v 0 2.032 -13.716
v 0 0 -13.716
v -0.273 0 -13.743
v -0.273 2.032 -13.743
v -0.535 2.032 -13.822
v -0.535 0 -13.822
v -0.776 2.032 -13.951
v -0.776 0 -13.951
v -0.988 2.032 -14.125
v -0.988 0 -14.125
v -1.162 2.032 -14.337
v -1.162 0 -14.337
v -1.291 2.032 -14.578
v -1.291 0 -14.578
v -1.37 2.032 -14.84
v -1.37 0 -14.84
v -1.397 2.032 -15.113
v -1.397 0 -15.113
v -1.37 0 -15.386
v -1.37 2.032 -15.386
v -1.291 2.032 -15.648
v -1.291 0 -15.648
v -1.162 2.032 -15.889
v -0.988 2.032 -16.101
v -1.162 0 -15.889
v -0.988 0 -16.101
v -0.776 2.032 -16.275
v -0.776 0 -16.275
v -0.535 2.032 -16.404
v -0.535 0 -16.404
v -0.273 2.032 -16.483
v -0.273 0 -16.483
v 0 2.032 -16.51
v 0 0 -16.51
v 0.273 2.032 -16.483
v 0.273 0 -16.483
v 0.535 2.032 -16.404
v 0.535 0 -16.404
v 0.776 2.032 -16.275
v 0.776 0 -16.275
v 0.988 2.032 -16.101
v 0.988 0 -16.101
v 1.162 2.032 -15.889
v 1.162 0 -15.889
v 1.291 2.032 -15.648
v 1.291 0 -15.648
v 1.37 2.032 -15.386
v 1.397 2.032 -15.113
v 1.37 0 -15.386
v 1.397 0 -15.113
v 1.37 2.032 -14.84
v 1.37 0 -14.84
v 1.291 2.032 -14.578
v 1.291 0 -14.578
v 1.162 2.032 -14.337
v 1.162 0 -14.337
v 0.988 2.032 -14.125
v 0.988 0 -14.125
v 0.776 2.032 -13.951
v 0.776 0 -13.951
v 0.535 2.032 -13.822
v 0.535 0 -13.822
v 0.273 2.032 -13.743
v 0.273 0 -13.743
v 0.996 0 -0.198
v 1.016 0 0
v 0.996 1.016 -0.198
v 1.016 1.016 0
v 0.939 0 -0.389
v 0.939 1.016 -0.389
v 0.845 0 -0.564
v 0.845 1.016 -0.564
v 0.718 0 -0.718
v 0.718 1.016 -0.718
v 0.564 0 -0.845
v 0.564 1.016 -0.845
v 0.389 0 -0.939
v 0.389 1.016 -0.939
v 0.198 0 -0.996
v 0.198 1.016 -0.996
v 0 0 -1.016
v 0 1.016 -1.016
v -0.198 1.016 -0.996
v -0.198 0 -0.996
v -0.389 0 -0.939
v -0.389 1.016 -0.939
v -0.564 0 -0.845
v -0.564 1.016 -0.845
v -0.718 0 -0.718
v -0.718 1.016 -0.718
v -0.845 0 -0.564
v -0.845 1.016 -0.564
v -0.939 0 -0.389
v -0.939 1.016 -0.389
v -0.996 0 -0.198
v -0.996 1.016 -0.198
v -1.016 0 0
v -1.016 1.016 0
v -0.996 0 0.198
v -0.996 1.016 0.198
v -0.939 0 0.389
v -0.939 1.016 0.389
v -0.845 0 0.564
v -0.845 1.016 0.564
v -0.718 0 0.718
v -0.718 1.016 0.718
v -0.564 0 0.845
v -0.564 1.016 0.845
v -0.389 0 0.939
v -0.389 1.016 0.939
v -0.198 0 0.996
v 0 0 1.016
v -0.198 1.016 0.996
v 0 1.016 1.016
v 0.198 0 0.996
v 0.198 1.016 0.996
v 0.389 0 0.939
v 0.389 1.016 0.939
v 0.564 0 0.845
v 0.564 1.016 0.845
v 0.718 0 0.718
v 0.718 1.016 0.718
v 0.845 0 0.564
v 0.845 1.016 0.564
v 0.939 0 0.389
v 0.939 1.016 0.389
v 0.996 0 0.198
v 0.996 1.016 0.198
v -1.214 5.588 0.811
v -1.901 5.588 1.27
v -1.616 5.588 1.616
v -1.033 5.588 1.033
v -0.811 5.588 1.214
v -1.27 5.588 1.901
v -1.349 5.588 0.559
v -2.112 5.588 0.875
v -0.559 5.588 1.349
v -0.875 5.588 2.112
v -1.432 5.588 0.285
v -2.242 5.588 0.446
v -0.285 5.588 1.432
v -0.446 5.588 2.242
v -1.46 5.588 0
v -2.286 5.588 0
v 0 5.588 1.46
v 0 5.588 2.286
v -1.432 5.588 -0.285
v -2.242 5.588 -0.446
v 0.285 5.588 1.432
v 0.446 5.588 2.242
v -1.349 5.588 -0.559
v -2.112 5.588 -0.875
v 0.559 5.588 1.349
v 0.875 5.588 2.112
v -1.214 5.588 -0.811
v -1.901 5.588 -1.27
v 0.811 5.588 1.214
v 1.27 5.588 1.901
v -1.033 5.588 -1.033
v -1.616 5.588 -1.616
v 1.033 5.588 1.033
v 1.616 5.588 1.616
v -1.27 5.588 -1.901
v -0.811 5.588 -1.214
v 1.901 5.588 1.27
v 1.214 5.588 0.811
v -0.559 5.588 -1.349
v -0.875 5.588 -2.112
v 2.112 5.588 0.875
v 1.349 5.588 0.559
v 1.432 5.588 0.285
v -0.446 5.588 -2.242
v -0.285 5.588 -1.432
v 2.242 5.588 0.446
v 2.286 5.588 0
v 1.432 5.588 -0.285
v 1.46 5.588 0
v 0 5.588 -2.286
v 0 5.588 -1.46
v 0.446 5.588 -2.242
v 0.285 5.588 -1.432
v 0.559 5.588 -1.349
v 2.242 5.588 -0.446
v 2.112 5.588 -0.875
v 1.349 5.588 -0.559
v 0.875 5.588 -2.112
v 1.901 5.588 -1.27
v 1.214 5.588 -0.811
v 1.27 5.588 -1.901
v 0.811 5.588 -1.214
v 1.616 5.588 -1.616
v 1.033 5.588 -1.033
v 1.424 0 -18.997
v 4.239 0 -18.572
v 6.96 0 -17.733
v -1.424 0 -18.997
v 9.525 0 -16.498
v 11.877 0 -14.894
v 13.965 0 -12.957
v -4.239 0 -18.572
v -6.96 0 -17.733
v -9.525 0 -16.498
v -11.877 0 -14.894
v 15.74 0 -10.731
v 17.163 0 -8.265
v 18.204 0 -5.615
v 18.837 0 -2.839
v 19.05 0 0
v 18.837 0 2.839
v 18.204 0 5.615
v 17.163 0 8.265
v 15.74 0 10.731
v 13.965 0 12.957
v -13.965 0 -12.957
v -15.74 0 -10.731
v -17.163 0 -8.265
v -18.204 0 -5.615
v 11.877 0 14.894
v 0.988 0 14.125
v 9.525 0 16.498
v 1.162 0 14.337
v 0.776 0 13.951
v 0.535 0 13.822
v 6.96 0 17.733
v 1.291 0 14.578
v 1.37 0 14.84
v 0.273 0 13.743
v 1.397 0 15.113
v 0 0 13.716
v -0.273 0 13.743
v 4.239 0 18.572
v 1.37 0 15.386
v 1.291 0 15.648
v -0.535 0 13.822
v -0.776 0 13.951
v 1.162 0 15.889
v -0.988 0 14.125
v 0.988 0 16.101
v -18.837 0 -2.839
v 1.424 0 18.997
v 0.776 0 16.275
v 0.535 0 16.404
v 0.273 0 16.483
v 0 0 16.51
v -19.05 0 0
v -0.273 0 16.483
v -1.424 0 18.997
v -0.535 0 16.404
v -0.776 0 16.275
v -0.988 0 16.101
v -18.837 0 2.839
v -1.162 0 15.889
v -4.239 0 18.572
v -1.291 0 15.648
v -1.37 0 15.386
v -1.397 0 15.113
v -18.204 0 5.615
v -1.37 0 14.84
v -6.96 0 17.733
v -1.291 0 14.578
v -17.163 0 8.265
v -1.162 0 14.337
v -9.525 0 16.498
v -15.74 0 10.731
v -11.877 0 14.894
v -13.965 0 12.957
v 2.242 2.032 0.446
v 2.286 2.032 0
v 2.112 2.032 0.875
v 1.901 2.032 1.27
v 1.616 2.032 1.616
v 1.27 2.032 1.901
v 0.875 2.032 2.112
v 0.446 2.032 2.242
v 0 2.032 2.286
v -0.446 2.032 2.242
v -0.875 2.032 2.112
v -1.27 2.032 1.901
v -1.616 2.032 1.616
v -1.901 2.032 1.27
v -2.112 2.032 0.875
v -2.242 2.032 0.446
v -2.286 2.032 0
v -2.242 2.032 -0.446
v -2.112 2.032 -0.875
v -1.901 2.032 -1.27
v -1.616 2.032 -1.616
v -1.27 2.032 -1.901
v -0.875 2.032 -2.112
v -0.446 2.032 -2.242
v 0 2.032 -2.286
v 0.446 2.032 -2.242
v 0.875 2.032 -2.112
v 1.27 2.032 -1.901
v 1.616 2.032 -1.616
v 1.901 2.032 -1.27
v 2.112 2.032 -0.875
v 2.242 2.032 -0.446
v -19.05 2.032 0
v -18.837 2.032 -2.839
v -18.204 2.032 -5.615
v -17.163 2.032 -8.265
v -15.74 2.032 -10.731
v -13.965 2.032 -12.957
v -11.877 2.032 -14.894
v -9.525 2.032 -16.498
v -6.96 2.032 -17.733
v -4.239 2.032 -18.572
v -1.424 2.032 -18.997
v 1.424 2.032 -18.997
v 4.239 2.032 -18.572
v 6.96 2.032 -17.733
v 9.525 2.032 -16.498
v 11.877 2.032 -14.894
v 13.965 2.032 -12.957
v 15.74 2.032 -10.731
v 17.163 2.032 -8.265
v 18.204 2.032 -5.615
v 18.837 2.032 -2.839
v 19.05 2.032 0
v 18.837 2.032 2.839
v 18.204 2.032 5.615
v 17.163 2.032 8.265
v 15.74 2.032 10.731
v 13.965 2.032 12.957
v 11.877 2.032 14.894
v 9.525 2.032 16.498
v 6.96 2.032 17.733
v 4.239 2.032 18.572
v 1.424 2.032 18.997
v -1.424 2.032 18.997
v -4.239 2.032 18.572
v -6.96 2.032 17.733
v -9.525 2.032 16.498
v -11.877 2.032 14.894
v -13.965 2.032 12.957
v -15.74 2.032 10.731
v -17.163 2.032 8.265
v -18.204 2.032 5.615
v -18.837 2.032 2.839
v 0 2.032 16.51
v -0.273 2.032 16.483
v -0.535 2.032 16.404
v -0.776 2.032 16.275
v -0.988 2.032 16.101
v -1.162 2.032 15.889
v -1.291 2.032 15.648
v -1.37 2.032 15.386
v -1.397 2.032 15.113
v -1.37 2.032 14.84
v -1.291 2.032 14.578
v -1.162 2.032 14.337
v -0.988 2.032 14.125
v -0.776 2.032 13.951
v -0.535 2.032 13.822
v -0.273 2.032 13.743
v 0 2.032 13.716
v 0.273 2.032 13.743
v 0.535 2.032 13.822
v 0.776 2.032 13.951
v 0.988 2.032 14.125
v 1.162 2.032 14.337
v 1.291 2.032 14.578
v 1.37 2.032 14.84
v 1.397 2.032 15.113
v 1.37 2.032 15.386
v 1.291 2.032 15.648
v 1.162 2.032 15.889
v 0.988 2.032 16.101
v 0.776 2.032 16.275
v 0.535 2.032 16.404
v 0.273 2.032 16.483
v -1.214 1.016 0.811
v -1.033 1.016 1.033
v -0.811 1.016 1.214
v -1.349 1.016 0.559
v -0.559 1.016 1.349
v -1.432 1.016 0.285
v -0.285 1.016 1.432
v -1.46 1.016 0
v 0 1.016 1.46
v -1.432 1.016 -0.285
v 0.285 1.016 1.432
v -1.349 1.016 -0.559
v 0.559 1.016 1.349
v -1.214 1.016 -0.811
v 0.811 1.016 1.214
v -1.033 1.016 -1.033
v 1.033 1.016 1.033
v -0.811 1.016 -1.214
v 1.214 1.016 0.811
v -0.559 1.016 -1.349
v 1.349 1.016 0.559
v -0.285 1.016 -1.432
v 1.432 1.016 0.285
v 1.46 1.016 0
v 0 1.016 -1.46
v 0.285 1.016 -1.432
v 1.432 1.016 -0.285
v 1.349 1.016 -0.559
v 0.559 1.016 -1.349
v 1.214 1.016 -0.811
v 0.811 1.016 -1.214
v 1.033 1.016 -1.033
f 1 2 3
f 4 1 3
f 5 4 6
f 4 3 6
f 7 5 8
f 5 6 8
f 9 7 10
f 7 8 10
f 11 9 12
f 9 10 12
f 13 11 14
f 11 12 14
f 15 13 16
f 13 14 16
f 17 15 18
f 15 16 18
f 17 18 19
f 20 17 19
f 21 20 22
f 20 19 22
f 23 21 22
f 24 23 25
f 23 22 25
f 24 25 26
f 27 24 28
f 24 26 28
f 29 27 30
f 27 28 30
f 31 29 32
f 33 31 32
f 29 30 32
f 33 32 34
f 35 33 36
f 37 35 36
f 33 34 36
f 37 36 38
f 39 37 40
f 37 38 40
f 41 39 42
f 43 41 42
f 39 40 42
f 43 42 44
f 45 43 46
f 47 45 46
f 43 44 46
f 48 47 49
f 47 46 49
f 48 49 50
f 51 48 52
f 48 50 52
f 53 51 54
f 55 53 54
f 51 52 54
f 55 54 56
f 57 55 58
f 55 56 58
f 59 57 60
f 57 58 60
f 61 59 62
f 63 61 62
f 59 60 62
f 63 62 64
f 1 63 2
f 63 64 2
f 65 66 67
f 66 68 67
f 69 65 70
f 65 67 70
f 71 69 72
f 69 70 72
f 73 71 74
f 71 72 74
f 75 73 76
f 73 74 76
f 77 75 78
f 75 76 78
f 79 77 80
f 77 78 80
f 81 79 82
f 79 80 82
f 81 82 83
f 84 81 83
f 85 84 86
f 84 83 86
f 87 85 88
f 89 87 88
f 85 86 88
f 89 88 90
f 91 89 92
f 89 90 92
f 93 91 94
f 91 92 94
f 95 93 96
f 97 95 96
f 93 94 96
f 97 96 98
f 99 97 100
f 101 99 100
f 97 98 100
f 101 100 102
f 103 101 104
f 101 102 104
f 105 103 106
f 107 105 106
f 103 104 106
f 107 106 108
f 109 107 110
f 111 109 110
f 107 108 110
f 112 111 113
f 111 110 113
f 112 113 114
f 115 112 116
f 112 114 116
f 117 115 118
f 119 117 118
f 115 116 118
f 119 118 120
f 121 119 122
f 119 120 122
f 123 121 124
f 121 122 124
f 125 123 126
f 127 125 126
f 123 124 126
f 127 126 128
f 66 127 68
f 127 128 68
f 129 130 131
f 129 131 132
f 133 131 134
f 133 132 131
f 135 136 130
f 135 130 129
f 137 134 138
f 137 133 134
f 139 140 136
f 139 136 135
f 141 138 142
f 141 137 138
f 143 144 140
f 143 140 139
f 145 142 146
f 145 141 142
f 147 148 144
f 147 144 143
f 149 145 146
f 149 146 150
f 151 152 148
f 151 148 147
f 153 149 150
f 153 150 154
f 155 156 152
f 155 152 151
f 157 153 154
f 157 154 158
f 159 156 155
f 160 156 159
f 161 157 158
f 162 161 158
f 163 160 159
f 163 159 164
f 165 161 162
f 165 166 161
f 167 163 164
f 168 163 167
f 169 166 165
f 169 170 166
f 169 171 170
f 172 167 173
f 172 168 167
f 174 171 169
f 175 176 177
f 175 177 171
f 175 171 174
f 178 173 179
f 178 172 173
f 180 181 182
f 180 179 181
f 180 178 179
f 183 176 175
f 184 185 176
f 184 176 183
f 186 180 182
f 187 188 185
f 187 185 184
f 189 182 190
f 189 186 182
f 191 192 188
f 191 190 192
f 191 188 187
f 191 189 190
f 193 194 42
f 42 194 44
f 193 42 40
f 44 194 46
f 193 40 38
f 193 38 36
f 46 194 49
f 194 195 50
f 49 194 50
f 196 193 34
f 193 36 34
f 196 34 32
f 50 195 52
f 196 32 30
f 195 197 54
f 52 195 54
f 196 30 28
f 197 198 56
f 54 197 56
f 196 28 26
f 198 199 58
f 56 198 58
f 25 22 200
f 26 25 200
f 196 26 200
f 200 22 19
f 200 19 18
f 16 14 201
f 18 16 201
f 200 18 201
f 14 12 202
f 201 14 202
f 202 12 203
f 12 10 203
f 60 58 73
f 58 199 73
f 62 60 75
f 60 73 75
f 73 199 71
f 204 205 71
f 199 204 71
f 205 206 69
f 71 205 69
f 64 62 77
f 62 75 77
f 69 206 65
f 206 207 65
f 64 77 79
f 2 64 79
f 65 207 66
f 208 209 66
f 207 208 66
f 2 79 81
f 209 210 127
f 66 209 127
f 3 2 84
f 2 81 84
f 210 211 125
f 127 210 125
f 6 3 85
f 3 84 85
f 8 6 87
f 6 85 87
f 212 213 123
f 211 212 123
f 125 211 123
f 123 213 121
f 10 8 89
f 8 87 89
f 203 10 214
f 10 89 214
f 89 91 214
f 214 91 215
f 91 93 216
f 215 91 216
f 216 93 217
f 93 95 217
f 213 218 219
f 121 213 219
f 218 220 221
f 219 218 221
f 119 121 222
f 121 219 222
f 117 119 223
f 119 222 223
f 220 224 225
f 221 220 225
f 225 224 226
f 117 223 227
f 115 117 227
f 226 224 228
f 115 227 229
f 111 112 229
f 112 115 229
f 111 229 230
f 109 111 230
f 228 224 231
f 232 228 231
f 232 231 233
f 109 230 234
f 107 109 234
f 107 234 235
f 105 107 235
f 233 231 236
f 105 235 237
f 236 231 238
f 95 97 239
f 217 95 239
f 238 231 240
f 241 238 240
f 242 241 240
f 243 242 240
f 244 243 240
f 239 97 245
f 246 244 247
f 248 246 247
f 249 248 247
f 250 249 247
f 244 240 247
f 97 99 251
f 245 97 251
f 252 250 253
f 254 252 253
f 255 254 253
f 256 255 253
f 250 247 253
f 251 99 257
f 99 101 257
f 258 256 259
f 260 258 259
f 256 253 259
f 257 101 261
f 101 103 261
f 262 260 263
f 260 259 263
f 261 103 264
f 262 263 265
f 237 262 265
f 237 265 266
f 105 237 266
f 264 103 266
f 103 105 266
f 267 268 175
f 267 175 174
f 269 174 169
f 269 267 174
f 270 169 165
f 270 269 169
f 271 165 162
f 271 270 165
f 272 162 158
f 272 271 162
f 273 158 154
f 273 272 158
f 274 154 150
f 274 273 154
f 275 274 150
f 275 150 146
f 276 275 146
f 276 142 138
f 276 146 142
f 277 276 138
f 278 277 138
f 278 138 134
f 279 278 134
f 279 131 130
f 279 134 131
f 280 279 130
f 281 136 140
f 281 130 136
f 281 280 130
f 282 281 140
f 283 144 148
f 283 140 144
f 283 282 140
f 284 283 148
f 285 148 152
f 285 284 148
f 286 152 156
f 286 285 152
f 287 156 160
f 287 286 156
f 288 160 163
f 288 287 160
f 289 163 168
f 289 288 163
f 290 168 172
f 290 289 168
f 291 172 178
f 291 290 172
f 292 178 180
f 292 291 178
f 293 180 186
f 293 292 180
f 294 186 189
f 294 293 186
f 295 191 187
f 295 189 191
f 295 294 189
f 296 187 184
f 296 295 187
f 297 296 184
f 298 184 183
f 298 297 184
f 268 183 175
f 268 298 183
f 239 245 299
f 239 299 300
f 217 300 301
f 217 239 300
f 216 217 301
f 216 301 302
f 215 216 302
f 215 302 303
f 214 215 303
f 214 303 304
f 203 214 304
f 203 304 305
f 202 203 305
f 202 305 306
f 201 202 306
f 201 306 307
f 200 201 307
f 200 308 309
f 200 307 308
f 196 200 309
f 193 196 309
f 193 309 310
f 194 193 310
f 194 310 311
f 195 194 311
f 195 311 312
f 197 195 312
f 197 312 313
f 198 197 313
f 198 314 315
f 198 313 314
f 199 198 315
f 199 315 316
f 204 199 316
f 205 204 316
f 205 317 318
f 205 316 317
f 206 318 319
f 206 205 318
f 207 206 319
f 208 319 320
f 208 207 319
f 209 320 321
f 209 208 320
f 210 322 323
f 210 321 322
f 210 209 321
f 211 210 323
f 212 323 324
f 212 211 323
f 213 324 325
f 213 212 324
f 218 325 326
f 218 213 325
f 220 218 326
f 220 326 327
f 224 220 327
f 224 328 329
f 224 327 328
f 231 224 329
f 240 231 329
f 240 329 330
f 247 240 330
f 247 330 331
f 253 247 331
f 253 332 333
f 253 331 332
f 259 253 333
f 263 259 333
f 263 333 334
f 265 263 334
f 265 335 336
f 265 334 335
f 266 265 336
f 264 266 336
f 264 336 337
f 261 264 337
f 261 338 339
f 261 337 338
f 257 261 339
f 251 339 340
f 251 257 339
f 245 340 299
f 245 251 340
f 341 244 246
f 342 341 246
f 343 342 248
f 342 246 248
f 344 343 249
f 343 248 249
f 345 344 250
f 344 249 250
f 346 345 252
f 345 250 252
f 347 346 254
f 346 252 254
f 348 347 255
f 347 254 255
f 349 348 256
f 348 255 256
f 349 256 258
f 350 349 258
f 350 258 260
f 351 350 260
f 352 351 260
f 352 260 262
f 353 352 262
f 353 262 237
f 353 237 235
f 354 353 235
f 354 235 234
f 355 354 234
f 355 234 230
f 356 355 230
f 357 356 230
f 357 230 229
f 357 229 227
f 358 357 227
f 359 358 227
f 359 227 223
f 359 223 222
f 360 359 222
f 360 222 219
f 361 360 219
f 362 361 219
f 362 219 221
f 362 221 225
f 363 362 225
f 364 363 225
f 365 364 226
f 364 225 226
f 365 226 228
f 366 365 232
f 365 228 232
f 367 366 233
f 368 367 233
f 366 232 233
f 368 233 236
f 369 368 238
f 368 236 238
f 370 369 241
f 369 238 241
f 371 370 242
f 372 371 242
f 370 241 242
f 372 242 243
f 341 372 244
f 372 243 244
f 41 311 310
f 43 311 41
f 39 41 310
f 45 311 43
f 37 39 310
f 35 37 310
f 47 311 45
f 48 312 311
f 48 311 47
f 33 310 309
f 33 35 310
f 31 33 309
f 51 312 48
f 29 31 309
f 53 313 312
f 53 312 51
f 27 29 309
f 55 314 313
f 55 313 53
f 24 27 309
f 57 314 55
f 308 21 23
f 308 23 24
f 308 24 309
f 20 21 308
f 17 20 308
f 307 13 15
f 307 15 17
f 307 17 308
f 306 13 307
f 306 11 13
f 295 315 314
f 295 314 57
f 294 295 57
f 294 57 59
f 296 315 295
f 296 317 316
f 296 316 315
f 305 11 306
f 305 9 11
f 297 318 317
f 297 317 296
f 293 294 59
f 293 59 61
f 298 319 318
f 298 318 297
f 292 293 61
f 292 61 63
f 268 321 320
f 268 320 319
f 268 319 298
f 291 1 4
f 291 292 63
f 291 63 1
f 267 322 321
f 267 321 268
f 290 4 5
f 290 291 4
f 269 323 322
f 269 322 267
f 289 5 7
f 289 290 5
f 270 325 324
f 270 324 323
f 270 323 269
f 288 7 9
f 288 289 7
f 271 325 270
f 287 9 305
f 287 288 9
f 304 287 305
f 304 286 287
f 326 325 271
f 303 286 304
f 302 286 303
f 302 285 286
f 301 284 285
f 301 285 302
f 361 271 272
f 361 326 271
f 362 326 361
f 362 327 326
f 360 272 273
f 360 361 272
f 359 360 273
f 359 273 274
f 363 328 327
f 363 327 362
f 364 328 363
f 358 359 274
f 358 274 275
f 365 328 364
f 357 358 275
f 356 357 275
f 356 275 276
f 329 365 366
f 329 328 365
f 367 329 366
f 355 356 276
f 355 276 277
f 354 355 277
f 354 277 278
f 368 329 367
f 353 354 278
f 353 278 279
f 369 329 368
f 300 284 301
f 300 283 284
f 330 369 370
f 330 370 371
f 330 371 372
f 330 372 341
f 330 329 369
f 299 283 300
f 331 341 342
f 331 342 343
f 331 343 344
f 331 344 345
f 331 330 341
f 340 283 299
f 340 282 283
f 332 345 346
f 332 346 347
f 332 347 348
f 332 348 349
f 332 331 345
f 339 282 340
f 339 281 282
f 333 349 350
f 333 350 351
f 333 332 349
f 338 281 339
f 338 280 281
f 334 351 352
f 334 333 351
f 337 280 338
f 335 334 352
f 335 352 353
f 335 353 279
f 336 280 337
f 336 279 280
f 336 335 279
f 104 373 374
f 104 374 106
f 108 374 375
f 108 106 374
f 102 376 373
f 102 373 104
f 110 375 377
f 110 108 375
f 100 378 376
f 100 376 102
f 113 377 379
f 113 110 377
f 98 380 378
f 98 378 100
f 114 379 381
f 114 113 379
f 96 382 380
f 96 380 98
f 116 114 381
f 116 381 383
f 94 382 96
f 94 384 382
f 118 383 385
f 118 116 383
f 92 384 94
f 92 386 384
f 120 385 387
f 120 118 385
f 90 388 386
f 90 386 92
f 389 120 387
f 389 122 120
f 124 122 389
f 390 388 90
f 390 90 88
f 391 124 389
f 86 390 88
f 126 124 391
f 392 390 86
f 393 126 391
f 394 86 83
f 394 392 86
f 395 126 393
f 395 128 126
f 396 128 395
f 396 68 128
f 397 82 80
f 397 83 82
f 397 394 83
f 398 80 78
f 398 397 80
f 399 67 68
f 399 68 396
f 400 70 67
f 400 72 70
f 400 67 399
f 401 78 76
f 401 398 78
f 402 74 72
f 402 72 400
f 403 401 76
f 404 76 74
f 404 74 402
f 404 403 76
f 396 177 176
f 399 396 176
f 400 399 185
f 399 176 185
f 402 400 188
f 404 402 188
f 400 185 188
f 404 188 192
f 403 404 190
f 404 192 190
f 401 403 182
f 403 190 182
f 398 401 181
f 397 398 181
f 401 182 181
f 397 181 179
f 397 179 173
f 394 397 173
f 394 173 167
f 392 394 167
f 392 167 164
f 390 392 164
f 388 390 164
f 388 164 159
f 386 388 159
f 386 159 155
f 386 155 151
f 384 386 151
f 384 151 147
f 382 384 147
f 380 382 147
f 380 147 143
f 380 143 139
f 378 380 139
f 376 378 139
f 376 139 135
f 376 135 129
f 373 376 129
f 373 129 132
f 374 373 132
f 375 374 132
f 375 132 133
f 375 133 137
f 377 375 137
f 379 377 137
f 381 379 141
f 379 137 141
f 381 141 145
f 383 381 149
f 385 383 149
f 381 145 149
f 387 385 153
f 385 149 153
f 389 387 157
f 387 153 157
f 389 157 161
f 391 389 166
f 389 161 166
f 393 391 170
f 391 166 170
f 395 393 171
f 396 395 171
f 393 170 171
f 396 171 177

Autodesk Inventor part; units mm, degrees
ref_plane "YZ Plane" through (0, 0, 0) normal (1, 0, 0) x (0, 1, 0)
ref_plane "XZ Plane" through (0, 0, 0) normal (0, 1, 0) x (-1, 0, 0)
ref_plane "XY Plane" through (0, 0, 0) normal (0, 0, 1) x (1, 0, 0)
sketch "Sketch1" plane through (0, 0, 0) normal (0, 1, 0) x (-1, 0, 0)
  circle A0 centre (0, 0) radius 19.05
  dimension "d0" = 38.1
extrude "Extrusion1" add sketch "Sketch1" along normal blind 2.032
sketch "Sketch5" plane through (0, 2.032, 0) normal (0, 1, 0) x (1, 0, 0)
  circle A0 centre (0, 0) radius 2.286
  dimension "d14" = 4.572
extrude "Extrusion3" add sketch "Sketch5" along normal blind 3.556
sketch "Sketch6" plane through (0, 5.588, 0) normal (0, 1, 0) x (1, 0, 0)
  circle A0 centre (0, 0) radius 1.4605
  dimension "d17" = 2.921
extrude "Extrusion4" cut sketch "Sketch6" against normal blind 4.572
sketch "Sketch7" plane through (0, 1.016, 0) normal (0, 1, 0) x (1, 0, 0)
  circle A0 centre (0, 0) radius 1.016
  dimension "d20" = 2.032
extrude "Extrusion5" cut sketch "Sketch7" against normal blind 4.572
sketch "Sketch8" plane through (0, 2.032, 0) normal (0, 1, 0) x (1, 0, 0)
  circle A0 centre (0, 0) radius 19.05 projected
  line L0 (0, 19.05) -> (0, 15.113)
  line L1 (0, -19.05) -> (0, -15.113)
  dimension "d23" = 3.937
  dimension "d24" = 3.937
hole "Hole2" at (0, 2.032, -15.113) direction (0, -1, 0) diameter 2.794 end through all
sketch "Sketch9" plane through (0, 2.032, 0) normal (0, 1, 0) x (1, 0, 0)
  circle A0 centre (0, 0) radius 19.05 projected
  line L0 (0, -19.05) -> (0, -15.113)
  dimension "d32" = 3.937
hole "Hole3" at (0, 2.032, 15.113) direction (0, -1, 0) diameter 2.794 end through all
properties part number "Servo Horn v1"
